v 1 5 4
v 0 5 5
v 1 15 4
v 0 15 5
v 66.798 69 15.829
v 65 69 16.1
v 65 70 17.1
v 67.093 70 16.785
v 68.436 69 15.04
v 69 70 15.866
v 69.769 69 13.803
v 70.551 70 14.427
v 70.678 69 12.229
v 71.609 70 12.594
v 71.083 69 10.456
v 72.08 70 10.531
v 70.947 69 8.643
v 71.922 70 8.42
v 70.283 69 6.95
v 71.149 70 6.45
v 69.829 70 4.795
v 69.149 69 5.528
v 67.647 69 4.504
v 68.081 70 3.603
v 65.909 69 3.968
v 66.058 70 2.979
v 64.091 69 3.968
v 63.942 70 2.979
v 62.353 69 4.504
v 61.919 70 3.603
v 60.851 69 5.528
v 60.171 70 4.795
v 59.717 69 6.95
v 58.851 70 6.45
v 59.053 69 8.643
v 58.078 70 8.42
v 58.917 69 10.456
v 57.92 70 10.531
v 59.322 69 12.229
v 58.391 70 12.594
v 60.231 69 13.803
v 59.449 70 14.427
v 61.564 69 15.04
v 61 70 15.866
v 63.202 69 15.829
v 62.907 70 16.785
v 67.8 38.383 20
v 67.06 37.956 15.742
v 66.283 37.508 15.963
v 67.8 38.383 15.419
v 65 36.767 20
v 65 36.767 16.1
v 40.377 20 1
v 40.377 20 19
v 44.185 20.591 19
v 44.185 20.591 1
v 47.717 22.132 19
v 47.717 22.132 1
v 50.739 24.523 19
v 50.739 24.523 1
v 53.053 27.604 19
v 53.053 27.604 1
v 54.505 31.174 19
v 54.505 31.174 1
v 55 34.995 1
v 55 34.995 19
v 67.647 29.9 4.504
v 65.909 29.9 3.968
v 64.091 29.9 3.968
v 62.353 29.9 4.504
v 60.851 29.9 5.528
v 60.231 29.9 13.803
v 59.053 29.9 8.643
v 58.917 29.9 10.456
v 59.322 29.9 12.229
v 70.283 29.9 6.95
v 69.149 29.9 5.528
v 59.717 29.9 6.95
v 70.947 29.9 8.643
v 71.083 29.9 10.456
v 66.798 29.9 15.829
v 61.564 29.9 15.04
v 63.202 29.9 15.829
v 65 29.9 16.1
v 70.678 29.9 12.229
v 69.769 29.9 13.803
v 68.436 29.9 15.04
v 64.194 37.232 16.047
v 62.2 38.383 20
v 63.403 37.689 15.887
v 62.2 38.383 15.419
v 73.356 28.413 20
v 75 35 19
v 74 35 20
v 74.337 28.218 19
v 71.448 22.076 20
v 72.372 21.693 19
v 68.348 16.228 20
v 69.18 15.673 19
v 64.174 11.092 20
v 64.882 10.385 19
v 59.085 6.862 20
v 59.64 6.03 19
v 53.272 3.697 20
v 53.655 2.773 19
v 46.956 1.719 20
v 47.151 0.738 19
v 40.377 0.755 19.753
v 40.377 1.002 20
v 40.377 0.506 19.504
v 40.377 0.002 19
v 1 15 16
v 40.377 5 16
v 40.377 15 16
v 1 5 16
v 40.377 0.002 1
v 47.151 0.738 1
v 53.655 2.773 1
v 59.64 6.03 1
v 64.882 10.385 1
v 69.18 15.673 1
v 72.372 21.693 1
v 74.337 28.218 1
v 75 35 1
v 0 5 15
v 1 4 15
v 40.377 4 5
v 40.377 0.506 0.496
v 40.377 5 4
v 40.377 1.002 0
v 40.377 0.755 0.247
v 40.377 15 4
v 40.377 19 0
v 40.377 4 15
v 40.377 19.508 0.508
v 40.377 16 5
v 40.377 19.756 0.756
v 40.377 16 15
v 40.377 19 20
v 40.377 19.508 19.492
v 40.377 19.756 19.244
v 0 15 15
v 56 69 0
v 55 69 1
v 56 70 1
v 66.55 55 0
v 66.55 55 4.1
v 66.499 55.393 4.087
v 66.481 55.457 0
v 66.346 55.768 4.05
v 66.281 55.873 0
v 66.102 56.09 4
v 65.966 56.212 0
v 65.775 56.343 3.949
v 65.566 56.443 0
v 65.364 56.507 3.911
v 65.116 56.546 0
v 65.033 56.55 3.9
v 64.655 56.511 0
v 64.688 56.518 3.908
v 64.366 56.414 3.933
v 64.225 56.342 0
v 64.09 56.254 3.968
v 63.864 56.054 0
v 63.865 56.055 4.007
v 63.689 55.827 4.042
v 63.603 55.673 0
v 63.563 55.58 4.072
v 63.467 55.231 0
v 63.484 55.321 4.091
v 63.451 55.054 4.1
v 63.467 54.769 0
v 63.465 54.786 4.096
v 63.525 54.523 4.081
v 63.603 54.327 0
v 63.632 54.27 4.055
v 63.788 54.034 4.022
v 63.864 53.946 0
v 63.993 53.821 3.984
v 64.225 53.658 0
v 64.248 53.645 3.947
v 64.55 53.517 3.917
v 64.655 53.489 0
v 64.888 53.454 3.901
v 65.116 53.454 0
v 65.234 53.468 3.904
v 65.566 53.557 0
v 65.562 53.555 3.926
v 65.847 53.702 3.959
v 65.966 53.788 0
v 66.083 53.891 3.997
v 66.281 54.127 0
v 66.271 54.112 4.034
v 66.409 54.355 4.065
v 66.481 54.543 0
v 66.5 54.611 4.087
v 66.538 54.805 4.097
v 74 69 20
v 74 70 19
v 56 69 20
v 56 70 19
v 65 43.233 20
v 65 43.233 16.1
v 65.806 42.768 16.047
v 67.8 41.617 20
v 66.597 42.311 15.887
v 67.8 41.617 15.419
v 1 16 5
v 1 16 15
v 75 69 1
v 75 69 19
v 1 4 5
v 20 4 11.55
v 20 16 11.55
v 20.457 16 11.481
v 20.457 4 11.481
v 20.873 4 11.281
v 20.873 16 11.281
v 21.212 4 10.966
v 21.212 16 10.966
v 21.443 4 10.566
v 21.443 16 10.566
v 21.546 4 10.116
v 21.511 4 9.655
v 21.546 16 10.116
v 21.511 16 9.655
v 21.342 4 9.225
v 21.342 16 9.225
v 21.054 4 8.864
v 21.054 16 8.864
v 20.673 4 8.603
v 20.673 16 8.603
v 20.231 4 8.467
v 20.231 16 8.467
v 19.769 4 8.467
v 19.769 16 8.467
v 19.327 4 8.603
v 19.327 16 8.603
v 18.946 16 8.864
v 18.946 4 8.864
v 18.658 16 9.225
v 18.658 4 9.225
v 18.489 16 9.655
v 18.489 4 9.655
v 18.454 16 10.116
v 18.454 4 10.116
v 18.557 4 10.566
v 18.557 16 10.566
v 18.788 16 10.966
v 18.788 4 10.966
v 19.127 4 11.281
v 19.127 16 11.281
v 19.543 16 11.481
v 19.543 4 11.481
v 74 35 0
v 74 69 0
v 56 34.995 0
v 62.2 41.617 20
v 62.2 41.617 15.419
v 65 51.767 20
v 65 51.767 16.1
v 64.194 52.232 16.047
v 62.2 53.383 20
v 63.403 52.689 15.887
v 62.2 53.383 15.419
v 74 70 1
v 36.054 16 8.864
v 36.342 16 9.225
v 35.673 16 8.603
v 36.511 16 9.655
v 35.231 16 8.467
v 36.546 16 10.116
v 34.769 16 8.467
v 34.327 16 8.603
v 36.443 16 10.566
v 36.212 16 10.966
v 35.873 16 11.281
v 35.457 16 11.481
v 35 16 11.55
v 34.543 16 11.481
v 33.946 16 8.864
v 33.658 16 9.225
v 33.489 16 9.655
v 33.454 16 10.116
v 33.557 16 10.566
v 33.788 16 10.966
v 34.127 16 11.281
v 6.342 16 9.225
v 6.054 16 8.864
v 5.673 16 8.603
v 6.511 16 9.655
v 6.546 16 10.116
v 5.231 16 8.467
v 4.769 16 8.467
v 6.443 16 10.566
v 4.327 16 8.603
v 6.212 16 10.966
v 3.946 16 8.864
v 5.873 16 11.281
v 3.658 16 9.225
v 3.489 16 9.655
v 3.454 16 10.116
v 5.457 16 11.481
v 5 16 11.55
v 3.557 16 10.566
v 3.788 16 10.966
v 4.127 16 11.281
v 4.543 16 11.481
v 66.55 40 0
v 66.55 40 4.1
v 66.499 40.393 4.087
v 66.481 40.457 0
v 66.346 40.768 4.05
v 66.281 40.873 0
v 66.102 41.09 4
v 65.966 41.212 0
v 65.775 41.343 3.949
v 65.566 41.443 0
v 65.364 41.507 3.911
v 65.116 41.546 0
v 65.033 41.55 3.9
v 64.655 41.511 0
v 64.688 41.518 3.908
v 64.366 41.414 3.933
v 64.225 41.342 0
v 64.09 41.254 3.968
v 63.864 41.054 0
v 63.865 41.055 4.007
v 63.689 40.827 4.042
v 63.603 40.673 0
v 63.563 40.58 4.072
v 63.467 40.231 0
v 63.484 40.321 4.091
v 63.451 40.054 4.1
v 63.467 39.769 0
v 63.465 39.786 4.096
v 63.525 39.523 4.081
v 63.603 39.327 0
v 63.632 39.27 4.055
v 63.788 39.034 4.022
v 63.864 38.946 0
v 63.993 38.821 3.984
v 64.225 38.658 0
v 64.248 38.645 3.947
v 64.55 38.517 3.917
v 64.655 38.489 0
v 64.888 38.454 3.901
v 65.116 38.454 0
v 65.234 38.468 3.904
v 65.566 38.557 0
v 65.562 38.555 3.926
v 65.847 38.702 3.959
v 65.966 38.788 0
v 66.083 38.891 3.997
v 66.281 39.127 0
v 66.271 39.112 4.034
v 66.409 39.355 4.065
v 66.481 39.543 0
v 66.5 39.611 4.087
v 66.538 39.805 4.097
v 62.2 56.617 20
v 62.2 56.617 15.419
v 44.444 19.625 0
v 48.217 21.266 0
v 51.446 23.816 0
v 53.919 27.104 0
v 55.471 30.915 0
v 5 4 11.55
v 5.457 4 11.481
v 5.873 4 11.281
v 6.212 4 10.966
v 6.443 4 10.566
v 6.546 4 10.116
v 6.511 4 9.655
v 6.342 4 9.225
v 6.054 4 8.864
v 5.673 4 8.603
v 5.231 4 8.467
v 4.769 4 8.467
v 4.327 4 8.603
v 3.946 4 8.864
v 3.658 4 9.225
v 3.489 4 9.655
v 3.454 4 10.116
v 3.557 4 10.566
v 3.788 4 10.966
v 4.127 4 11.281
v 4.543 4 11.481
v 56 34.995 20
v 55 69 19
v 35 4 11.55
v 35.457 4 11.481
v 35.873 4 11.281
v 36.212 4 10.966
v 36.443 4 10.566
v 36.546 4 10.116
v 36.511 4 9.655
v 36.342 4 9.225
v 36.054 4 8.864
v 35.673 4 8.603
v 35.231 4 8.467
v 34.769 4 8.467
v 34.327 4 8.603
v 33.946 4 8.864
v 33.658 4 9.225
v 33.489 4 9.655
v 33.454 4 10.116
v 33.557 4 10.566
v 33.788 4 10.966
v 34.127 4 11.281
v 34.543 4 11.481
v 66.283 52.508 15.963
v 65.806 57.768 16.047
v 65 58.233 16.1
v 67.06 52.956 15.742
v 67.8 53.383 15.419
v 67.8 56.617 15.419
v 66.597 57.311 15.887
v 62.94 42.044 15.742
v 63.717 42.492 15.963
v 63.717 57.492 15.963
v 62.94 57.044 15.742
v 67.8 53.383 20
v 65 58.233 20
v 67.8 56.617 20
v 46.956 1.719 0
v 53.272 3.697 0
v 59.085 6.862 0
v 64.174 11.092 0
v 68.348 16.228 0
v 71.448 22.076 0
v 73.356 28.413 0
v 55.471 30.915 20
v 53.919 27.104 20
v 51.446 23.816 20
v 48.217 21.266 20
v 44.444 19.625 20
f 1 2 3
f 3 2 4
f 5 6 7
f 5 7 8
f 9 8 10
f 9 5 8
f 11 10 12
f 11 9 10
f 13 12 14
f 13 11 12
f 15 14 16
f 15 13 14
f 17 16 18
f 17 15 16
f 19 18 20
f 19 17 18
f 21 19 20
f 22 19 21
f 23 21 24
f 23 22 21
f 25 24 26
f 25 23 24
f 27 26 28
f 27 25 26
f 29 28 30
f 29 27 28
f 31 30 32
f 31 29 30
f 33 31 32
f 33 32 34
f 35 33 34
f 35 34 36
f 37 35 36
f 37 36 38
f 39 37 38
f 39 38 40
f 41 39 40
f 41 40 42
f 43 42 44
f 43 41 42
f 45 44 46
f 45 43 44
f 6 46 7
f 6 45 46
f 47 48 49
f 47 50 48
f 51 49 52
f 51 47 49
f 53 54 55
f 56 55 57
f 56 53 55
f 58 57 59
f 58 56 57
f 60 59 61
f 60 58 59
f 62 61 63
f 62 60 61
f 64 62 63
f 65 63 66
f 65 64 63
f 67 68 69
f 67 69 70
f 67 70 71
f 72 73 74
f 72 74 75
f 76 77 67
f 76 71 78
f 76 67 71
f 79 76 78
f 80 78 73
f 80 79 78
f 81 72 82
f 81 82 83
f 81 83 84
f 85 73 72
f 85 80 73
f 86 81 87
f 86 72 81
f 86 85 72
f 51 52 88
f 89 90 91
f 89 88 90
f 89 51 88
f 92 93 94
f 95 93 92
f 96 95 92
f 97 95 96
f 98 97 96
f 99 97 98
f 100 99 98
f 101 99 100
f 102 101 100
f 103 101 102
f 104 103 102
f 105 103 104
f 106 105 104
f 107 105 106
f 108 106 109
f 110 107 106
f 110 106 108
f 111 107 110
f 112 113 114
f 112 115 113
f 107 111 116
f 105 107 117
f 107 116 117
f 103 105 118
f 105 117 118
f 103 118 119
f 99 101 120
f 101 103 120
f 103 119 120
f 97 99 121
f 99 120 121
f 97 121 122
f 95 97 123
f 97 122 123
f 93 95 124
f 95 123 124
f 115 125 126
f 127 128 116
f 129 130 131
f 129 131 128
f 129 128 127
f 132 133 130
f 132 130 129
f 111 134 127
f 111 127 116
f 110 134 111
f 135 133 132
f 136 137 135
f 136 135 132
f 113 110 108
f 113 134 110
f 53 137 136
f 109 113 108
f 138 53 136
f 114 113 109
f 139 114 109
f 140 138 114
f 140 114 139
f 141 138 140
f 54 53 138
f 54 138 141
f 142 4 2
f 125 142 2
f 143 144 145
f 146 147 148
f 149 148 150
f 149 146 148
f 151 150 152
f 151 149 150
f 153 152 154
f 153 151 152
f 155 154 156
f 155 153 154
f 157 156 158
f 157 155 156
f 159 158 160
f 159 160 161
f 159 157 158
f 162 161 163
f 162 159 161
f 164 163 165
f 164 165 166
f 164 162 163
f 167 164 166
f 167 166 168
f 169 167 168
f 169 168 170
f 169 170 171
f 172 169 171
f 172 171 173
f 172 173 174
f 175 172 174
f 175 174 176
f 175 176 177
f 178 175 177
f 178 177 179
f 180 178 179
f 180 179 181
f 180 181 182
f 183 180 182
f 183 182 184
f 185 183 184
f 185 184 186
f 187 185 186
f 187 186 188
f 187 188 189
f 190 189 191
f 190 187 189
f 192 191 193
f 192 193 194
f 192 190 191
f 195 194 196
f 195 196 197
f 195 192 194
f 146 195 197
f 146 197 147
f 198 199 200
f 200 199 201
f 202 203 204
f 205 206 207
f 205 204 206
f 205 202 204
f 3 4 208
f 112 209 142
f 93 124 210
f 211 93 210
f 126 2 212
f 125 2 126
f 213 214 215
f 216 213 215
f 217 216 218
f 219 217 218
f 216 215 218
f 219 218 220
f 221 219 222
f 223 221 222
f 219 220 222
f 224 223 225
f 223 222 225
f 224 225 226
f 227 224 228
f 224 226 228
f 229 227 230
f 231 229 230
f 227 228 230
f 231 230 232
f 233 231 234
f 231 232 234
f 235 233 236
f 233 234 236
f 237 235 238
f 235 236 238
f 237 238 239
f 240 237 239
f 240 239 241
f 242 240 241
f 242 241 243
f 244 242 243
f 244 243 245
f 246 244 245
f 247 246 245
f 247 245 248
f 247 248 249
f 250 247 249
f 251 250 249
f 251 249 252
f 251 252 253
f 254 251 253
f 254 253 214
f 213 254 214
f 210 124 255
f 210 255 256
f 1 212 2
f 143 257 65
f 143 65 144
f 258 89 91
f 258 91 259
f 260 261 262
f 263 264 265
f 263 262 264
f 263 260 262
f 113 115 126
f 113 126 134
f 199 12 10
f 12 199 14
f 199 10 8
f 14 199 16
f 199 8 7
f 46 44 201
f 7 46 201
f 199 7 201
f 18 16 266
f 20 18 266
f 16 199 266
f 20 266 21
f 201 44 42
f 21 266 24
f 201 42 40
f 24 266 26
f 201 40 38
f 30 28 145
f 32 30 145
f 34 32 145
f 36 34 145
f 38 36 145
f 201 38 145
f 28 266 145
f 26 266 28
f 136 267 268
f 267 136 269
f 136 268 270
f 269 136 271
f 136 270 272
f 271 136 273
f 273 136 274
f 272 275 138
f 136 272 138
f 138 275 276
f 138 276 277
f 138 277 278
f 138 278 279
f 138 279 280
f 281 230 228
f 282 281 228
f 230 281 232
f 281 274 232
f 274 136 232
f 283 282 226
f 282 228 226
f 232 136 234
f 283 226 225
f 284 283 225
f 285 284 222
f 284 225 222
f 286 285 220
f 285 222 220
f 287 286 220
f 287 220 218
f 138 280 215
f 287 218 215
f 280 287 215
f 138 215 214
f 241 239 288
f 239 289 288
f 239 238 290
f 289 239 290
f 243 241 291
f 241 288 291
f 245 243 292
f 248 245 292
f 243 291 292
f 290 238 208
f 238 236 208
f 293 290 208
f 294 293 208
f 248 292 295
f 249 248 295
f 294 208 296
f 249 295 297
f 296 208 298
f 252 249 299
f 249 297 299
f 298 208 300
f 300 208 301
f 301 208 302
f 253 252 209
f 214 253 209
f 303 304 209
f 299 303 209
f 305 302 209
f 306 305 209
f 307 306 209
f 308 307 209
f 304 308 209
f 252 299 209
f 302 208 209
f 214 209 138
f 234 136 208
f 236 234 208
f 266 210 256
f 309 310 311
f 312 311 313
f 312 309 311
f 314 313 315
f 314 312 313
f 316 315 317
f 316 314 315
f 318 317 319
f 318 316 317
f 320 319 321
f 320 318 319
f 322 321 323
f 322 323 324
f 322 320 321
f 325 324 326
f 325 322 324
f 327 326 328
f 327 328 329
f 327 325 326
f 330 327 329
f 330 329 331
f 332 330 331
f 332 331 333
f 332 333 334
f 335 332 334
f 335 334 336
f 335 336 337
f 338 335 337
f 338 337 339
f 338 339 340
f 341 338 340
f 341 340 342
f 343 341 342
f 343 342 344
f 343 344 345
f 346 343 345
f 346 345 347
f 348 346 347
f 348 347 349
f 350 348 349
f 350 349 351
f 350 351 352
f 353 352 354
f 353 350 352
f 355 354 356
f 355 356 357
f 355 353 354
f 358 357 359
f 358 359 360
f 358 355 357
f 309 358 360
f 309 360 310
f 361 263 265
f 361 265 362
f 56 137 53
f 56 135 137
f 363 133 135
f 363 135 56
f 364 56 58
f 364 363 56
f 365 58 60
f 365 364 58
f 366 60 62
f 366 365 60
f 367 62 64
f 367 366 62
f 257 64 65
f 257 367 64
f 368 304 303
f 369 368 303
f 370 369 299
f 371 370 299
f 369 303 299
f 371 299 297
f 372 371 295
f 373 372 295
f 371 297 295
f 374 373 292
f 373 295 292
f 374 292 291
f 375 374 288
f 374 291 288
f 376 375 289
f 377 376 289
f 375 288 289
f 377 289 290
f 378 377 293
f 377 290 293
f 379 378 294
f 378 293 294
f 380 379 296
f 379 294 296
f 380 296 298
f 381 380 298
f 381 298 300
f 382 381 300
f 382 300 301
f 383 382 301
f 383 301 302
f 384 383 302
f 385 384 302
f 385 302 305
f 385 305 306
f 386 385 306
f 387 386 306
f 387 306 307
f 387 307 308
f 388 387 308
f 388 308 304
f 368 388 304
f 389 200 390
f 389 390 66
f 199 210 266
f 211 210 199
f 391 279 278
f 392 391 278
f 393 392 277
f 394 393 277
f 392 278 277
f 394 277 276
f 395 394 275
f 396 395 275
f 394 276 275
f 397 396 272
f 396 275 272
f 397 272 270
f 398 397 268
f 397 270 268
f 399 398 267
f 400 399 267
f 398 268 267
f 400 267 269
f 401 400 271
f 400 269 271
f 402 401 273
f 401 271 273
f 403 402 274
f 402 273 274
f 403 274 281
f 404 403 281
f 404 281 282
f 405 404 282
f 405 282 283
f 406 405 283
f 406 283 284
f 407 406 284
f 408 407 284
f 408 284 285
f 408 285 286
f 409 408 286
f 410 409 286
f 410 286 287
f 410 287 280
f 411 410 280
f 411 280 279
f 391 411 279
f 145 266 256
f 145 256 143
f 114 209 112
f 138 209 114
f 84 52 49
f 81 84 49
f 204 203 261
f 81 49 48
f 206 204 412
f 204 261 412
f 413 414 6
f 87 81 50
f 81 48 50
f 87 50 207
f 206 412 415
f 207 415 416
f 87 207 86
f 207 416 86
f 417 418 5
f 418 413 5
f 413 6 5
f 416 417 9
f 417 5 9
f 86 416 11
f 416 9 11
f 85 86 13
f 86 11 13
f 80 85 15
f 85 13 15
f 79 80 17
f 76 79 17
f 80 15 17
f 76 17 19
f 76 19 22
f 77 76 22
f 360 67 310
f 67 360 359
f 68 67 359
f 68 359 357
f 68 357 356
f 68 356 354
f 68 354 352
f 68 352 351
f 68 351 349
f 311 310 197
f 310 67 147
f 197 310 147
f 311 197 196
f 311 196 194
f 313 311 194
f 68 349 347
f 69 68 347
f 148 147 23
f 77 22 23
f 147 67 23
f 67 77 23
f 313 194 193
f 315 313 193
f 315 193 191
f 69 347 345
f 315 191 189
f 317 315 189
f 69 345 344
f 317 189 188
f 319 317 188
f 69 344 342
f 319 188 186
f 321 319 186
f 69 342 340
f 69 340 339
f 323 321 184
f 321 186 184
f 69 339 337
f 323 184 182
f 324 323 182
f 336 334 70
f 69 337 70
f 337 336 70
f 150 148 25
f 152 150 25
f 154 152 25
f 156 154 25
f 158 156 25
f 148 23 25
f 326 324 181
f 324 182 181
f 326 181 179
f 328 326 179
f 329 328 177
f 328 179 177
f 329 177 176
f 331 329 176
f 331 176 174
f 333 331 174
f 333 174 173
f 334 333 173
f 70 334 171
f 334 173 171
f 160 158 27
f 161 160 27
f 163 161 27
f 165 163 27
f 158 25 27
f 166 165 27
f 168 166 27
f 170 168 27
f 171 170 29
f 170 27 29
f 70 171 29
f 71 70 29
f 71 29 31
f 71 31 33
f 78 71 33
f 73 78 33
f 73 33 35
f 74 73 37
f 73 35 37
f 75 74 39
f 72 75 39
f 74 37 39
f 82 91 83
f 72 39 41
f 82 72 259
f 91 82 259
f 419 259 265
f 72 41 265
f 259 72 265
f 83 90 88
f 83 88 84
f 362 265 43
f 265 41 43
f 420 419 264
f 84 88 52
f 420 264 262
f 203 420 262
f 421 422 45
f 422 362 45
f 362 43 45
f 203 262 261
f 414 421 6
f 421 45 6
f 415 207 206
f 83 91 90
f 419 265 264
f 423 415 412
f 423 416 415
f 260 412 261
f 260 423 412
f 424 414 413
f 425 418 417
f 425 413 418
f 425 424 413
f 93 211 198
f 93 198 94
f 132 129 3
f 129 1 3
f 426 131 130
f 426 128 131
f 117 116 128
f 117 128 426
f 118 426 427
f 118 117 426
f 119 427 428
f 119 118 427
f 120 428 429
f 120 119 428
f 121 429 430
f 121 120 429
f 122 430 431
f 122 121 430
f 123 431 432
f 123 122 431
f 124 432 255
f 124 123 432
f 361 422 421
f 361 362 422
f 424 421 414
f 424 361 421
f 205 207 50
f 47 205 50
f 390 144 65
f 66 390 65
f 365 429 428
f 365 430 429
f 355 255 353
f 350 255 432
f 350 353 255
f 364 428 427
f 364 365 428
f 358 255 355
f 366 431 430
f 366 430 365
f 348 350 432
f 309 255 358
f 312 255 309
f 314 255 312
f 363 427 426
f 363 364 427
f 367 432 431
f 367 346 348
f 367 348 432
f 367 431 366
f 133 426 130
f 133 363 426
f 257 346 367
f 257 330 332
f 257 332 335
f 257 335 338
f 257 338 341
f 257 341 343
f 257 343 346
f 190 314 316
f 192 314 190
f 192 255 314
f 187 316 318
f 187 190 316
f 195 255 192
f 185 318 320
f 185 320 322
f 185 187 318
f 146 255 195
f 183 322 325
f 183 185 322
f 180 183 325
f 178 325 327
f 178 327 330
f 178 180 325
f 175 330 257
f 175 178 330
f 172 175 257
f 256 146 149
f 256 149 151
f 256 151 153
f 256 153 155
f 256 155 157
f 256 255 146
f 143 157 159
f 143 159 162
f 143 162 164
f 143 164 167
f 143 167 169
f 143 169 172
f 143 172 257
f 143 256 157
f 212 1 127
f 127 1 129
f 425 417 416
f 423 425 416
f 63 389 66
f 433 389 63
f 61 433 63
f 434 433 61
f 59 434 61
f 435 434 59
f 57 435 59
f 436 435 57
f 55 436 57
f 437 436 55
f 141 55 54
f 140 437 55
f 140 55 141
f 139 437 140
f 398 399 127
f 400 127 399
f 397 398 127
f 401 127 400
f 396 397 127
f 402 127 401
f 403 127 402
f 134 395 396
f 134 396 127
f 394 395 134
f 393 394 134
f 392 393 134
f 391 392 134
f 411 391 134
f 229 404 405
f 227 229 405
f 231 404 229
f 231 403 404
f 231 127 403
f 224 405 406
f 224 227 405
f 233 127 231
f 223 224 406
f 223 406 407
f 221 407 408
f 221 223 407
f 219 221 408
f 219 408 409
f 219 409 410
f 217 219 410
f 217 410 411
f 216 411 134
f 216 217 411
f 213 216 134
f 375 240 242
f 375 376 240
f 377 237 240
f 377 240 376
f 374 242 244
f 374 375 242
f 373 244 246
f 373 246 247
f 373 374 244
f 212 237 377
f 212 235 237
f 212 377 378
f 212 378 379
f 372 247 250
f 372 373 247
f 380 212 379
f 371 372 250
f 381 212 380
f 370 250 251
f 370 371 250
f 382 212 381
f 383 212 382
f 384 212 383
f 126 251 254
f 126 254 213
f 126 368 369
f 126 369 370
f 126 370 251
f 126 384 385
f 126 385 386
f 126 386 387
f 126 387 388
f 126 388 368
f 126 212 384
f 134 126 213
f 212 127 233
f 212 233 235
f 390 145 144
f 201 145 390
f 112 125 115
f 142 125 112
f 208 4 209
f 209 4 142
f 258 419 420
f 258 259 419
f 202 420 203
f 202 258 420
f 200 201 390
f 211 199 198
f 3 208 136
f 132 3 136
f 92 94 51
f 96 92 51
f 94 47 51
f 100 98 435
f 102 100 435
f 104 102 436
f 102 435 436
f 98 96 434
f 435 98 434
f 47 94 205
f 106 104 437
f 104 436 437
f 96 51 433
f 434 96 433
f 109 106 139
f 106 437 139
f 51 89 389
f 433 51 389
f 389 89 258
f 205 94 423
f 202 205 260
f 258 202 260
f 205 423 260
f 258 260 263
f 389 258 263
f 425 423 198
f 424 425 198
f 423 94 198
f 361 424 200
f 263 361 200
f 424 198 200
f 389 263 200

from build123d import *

# Parameters (mm, degrees)
SKETCH_13_R          = 1.55
EXTRUDE_6_DEPTH      = 20
SKETCH_15_R          = 6.1
CUT_EXTRUDE_4_DEPTH  = 40.1
SKETCH_16_R          = 1.55
CUT_EXTRUDE_5_DEPTH  = 93.330926639
CUT_EXTRUDE_7_DEPTH  = 105.522724888
EXTRUDE_8_DEPTH      = 20
CUT_EXTRUDE_8_DEPTH  = 4
CUT_EXTRUDE_9_DEPTH  = 5
SKETCH_29_W          = 20
SKETCH_29_H          = 20
SKETCH_29_W_2        = 12
SKETCH_29_H_2        = 12
CUT_EXTRUDE_11_DEPTH = 40.376839
CHAMFER_7_SIZE       = 1


with BuildPart() as part:
    # 草图13 → 凸台-拉伸6 (new body)
    with BuildSketch(Plane.XY):
        Polygon((0, 0), (45, 0), (75, 0), (75, 70), (55, 70), (55, 20), (45, 20), (0, 20), align=None)
        with Locations((65, 40)):
            Circle(SKETCH_13_R, mode=Mode.SUBTRACT)
        with Locations((65, 55)):
            Circle(SKETCH_13_R, mode=Mode.SUBTRACT)
    extrude(amount=EXTRUDE_6_DEPTH)

    # 草图15 → 切除-拉伸4 (cut)
    with BuildSketch(Plane(origin=(0, 70, 0), x_dir=(1, 0, 0), z_dir=(0, 1, 0))):
        with Locations(Location((65, -10, 0), (0, 0, 270))):
            Circle(SKETCH_15_R)
    extrude(amount=-CUT_EXTRUDE_4_DEPTH, mode=Mode.SUBTRACT)

    # 草图16 → 切除-拉伸5 (cut, through all)
    with BuildSketch(Plane(origin=(0, 20, 0), x_dir=(1, 0, 0), z_dir=(0, 1, 0))):
        with Locations(Location((5, -10, 0), (0, 0, 270))):
            Circle(SKETCH_16_R)
        with Locations(Location((20, -10, 0), (0, 0, 270))):
            Circle(SKETCH_16_R)
        with Locations(Location((35, -10, 0), (0, 0, 270))):
            Circle(SKETCH_16_R)
    extrude(amount=-CUT_EXTRUDE_5_DEPTH, mode=Mode.SUBTRACT)

    # 草图24 → 切除-拉伸7 (cut, through all)
    with BuildSketch(Plane(origin=(0, 0, 0), x_dir=(-1, 0, 0), z_dir=(0, 0, -1))):
        with BuildLine():
            Line((-75, 35), (-75, 0))
            Line((-75, 0), (-40, 0))
            ThreePointArc((-40, 0), (-64.748737342, 10.251262658), (-75, 35))
        make_face()
    extrude(amount=-CUT_EXTRUDE_7_DEPTH, mode=Mode.SUBTRACT)

    # 草图25 → 凸台-拉伸8 (add)
    with BuildSketch(Plane(origin=(0, 0, 0), x_dir=(-1, 0, 0), z_dir=(0, 0, -1))):
        with BuildLine():
            Line((-55, 34.995265669), (-55, 20))
            Line((-55, 20), (-40.376838854, 20))
            ThreePointArc((-40.376838854, 20), (-50.739007934, 24.522744072), (-55, 34.995265669))
        make_face()
    extrude(amount=-EXTRUDE_8_DEPTH)

    # 草图26 → 切除-拉伸8 (cut)
    with BuildSketch(Plane.XZ):
        Polygon((4.044652328, 6.911206682), (7.197299644, 7.628247988), (8.152647316, 10.717041306), (5.955347672, 13.088793318), (2.802700356, 12.371752012), (1.847352684, 9.282958694), align=None)
        Polygon((19.044652328, 6.911206682), (22.197299644, 7.628247988), (23.152647316, 10.717041306), (20.955347672, 13.088793318), (17.802700356, 12.371752012), (16.847352684, 9.282958694), align=None)
        Polygon((34.044652328, 6.911206682), (37.197299644, 7.628247988), (38.152647316, 10.717041306), (35.955347672, 13.088793318), (32.802700356, 12.371752012), (31.847352684, 9.282958694), align=None)
    extrude(amount=-CUT_EXTRUDE_8_DEPTH, mode=Mode.SUBTRACT)

    # 草图27 → 切除-拉伸9 (cut)
    with BuildSketch(Plane(origin=(0, 0, 20), x_dir=(-1, 0, 0), z_dir=(0, 0, -1))):
        Polygon((-65, 36.766838493), (-62.2, 38.383419246), (-62.2, 41.616580754), (-65, 43.233161507), (-67.8, 41.616580754), (-67.8, 38.383419246), align=None)
        Polygon((-65, 51.766838493), (-62.2, 53.383419246), (-62.2, 56.616580754), (-65, 58.233161507), (-67.8, 56.616580754), (-67.8, 53.383419246), align=None)
    extrude(amount=CUT_EXTRUDE_9_DEPTH, mode=Mode.SUBTRACT)

    # 草图29 → 切除-拉伸11 (cut)
    with BuildSketch(Plane.ZY):
        with Locations((10, 10)):
            Rectangle(SKETCH_29_W, SKETCH_29_H)
        with Locations((10, 10)):
            Rectangle(SKETCH_29_W_2, SKETCH_29_H_2, mode=Mode.SUBTRACT)
    extrude(amount=-CUT_EXTRUDE_11_DEPTH, mode=Mode.SUBTRACT)

    # 倒角7
    chamfer_7_edges = [part.edges().sort_by_distance(p)[0] for p in [
        (55, 70, 10),
        (75, 70, 10),
        (65, 70, 20),
        (64.881613342, 10.384855932, 0),
        (64.881613342, 10.384855932, 20),
        (0, 16, 10),
        (20.1884195, 16, 16),
        (0, 4, 10),
        (20.1884195, 4, 4),
        (0, 10, 16),
        (20.1884195, 4, 16),
        (0, 10, 4),
        (20.1884195, 16, 4),
        (55, 52.497632834, 20),
        (65, 70, 3.9),
        (75, 52.5, 0),
        (75, 52.5, 20),
        (50.739007934, 24.522744072, 0),
        (50.739007934, 24.522744072, 20),
        (55, 52.497632834, 0),
        (65, 70, 0),
    ]]
    chamfer(chamfer_7_edges, length=CHAMFER_7_SIZE)


solid = part.part
